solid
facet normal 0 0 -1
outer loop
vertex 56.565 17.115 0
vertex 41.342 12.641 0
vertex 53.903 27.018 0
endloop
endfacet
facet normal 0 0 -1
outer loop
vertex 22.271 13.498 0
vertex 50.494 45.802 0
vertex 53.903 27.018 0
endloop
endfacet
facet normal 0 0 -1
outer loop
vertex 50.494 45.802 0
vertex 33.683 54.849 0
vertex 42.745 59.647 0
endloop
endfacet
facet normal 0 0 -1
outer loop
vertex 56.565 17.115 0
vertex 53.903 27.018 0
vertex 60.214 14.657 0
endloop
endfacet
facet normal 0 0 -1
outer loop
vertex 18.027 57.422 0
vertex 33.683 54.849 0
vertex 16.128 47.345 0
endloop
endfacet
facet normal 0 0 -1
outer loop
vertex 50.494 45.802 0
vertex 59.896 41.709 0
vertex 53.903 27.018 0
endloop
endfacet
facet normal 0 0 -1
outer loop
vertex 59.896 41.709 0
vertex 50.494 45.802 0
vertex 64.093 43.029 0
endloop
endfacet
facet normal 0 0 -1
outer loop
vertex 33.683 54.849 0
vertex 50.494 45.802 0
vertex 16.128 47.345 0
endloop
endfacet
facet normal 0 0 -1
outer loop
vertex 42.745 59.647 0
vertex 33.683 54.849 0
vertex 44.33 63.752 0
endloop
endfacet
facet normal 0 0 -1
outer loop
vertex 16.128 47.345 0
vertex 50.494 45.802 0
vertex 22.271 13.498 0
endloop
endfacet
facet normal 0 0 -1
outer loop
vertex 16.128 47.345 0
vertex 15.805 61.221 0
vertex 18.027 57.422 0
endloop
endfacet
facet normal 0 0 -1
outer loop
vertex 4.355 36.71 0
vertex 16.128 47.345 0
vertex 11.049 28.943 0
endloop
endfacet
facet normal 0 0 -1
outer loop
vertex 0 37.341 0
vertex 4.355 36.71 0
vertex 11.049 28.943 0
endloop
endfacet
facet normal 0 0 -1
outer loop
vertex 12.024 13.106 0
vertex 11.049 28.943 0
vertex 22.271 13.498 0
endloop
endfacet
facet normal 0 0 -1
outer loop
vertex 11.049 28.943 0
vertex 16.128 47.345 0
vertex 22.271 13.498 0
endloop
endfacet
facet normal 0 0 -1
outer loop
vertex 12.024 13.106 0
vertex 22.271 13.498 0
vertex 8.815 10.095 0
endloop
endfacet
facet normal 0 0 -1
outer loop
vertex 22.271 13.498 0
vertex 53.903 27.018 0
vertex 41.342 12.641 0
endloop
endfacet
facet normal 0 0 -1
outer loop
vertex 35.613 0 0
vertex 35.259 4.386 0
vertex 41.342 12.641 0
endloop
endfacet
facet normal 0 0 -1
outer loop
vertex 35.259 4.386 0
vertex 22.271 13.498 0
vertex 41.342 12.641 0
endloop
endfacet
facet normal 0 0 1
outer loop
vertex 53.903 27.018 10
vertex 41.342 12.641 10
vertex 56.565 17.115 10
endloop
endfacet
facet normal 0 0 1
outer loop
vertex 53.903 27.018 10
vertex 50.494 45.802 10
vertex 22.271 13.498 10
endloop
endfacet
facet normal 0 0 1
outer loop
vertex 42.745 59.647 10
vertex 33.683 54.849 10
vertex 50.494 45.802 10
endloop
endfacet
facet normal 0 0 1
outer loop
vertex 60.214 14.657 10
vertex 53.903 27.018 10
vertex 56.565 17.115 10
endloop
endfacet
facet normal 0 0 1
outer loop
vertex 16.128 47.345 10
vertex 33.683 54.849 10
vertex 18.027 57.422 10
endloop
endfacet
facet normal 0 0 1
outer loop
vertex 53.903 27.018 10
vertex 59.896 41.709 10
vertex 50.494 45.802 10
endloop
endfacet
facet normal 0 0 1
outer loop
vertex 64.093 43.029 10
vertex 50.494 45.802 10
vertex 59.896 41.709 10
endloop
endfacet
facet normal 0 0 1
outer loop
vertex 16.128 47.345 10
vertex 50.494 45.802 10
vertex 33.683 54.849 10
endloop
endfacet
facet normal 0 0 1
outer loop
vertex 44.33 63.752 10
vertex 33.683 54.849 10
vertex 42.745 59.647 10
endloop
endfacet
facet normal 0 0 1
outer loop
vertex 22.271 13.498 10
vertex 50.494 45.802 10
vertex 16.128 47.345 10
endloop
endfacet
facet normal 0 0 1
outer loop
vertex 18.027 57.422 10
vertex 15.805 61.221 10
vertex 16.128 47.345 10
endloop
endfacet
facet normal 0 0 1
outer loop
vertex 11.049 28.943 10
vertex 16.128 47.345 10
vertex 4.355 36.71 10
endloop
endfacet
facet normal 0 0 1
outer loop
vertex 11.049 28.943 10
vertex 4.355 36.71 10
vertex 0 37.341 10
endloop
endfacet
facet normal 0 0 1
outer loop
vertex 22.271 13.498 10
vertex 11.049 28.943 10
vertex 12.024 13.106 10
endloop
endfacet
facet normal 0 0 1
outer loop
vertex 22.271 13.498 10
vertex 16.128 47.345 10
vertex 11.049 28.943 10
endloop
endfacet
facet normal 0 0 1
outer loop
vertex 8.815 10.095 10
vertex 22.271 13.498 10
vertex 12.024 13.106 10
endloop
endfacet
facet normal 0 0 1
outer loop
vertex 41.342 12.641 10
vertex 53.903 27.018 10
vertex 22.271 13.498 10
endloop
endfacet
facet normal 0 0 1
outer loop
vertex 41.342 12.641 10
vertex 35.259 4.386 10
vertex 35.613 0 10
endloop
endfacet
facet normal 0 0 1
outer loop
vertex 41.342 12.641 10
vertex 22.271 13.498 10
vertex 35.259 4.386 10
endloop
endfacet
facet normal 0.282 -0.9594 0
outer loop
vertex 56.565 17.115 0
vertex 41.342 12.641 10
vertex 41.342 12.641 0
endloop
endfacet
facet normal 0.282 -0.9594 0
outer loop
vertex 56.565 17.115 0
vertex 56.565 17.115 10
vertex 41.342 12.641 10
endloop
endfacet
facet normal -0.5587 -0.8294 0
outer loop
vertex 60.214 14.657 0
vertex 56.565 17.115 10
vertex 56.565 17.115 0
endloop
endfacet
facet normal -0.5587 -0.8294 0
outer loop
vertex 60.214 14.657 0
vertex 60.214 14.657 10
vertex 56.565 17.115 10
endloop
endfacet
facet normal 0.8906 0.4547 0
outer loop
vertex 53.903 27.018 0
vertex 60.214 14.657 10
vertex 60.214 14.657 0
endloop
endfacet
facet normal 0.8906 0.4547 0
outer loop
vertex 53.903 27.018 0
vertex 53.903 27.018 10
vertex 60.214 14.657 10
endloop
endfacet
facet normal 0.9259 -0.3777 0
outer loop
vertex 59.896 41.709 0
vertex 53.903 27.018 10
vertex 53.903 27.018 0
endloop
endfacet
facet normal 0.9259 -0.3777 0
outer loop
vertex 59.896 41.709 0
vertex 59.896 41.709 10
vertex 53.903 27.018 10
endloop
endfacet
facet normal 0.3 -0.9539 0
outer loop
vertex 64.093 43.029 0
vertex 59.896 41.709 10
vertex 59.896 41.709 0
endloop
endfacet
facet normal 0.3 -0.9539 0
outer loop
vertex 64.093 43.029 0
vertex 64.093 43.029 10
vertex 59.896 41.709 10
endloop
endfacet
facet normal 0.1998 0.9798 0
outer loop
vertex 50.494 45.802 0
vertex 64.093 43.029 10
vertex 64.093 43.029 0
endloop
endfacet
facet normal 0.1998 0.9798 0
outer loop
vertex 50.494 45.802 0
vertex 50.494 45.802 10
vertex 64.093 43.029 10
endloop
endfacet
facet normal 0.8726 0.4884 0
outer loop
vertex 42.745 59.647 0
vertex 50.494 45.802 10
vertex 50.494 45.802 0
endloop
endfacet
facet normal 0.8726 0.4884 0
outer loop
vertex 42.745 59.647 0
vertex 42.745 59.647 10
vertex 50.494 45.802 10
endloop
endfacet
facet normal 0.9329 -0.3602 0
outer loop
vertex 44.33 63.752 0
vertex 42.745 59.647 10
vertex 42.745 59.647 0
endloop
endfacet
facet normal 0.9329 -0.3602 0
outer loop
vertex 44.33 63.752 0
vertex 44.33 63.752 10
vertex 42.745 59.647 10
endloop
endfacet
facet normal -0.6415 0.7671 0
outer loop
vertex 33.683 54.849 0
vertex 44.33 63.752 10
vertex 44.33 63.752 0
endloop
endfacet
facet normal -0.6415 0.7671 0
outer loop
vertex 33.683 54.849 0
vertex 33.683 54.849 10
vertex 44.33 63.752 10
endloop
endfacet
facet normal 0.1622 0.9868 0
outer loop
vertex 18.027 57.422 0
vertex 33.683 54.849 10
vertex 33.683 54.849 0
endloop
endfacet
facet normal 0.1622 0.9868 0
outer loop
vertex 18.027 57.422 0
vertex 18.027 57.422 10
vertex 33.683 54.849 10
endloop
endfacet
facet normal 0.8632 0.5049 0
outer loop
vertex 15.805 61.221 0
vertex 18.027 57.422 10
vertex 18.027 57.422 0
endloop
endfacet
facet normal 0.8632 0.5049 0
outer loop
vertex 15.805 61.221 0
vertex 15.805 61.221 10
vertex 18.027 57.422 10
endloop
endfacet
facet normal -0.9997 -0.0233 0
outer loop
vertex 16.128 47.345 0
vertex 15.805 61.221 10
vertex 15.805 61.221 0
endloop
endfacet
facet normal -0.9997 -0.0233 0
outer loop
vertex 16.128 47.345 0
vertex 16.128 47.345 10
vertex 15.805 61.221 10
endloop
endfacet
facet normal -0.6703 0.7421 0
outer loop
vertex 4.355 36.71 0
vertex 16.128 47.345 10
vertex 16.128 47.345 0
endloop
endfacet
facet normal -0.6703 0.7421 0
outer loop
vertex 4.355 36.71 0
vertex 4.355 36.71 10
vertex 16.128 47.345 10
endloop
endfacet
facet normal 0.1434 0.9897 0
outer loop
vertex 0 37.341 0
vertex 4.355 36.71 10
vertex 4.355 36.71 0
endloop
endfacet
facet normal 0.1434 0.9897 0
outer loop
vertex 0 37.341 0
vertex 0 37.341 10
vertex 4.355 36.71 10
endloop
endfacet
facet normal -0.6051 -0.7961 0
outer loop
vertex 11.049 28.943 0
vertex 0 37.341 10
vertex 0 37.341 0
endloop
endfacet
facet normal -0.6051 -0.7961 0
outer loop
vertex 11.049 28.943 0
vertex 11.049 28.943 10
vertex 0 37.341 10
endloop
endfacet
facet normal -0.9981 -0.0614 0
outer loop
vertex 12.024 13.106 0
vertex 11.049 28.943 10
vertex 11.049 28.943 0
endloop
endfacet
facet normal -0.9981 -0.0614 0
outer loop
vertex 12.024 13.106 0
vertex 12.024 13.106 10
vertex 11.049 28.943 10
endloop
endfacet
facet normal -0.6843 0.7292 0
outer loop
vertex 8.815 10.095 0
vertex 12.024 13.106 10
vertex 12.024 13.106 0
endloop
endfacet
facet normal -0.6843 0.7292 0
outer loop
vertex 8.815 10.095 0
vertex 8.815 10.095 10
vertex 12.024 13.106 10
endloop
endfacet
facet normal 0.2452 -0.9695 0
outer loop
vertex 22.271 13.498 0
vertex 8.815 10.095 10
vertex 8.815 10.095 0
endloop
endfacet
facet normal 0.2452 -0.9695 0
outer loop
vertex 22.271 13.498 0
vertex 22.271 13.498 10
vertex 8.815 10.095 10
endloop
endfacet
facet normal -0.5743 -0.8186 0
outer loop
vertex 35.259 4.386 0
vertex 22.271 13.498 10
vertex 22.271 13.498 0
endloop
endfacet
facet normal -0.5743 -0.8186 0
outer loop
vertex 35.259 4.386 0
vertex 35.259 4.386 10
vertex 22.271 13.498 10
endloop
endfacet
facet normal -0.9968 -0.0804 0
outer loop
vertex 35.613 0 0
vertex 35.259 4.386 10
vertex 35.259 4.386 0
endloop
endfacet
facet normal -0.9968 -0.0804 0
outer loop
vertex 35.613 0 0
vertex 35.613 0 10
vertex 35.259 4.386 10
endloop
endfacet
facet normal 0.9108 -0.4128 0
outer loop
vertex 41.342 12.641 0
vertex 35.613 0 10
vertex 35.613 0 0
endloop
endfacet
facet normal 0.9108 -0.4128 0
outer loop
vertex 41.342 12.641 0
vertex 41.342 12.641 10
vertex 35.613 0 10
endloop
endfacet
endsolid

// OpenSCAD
$fn = 32;

// ----------------------------------------------------------------------
// Fan rotor section: 7 blades, 22 mm hub radius, 11 mm blades
// ----------------------------------------------------------------------

// --- parameters (mm) ---
profile_height = 10;      // extrusion height
profile_points = 21;      // points of the closed outline

profile = [[53.903, 27.018], [59.896, 41.709], [64.093, 43.029], [50.494, 45.802], [42.745, 59.647], [44.33, 63.752], [33.683, 54.849], [18.027, 57.422], [15.805, 61.221], [16.128, 47.345], [4.355, 36.71], [0, 37.341], [11.049, 28.943], [12.024, 13.106], [8.815, 10.095], [22.271, 13.498], [35.259, 4.386], [35.613, 0], [41.342, 12.641], [56.565, 17.115], [60.214, 14.657]];  // single closed polygon, 21 points, counter clockwise

// --- the one profile operation ---
linear_extrude(height = profile_height) polygon(points = profile);
